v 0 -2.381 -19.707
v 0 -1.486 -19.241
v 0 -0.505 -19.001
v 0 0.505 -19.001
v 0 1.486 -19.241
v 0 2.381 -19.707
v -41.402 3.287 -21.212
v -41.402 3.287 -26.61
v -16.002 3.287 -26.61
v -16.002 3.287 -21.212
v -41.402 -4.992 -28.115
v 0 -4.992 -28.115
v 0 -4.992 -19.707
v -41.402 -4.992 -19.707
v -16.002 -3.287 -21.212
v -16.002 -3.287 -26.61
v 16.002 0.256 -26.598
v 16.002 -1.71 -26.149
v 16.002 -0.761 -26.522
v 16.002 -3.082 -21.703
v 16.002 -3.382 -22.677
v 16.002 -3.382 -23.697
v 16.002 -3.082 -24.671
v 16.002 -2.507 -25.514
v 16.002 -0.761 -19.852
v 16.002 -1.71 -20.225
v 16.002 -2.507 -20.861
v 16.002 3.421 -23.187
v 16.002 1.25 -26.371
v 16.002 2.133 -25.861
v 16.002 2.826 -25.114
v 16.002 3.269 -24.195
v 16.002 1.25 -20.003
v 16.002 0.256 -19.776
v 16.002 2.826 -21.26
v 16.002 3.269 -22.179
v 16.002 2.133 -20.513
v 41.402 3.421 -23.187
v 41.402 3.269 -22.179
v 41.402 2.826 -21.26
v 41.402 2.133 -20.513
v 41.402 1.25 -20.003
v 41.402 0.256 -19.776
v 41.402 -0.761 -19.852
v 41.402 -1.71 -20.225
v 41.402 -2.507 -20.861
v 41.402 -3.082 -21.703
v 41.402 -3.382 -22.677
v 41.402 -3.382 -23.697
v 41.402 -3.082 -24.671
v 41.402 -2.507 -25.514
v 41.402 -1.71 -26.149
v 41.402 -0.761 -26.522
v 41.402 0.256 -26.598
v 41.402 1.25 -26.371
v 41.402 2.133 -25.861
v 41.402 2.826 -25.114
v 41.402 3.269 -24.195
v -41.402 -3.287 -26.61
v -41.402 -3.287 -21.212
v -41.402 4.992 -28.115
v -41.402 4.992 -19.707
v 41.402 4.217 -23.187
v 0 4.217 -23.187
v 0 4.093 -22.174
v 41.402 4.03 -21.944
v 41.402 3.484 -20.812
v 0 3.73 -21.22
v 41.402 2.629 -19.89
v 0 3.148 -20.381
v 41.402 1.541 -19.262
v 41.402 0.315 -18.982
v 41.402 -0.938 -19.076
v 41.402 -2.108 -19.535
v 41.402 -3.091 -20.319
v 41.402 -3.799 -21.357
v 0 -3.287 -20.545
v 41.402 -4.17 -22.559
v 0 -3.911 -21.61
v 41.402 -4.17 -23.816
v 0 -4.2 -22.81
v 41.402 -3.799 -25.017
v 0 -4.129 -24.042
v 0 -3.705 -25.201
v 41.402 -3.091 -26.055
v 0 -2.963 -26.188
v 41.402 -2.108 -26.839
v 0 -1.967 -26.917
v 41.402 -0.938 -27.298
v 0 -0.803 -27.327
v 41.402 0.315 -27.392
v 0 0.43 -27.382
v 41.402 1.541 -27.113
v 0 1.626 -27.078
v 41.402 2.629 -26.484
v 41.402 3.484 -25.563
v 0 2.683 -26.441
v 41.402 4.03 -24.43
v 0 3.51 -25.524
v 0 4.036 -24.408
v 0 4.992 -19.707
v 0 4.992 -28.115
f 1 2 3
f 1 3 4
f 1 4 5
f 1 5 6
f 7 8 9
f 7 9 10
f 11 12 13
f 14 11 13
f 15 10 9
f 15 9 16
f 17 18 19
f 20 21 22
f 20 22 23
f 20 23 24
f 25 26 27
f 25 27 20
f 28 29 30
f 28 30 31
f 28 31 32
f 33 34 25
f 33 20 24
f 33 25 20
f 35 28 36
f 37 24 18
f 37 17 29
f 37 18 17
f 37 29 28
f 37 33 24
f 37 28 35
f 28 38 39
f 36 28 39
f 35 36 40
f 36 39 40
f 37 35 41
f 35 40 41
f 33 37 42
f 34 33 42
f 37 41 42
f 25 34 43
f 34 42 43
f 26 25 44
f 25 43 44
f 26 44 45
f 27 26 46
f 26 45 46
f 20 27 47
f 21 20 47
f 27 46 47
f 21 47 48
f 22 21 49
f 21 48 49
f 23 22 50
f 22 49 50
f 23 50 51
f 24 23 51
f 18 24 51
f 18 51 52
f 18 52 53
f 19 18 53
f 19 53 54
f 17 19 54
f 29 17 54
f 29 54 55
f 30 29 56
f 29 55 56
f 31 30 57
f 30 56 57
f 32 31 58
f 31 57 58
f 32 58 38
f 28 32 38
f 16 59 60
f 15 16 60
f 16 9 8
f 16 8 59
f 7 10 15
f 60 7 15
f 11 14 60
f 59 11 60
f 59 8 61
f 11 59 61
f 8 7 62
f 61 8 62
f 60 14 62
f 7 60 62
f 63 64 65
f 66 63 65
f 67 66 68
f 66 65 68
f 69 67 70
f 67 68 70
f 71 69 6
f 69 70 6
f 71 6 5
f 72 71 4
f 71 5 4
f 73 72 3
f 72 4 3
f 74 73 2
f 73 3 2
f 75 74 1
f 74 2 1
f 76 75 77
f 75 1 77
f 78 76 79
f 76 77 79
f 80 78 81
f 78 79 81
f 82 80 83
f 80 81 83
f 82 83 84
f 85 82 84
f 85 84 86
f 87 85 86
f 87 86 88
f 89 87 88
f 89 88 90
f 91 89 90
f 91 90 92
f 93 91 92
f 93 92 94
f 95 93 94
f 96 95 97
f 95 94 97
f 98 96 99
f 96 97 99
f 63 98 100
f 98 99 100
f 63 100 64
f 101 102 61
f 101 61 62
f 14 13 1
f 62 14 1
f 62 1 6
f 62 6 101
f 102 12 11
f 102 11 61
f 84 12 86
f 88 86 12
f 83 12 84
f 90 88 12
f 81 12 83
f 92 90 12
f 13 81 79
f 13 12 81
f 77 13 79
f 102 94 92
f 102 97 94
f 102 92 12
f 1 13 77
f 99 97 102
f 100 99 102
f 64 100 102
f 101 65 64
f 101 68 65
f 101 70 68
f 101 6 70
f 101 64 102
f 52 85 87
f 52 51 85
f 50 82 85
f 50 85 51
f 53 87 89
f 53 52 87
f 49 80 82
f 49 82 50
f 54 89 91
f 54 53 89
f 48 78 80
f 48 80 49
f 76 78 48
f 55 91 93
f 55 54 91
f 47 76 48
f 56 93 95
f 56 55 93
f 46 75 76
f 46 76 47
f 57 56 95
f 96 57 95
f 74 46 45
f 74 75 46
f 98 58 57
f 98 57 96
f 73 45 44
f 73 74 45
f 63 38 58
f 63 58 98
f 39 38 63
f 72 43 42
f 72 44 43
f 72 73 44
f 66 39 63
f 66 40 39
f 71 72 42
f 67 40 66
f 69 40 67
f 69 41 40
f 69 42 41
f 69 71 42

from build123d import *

# Parameters (mm, degrees)
F2_R     = 4.2169292551
F3_DEPTH = 41.402
F4_R     = 3.4205639175
F5_DEPTH = 25.4
F6_W     = 9.9848257378
F6_H     = 8.4082745016
F7_DEPTH = 41.402
F8_W     = 6.5733380616
F8_H     = 5.3974576294
F9_DEPTH = 25.4


# Not quite as in the source:
# - the program builds the solid bodies; features that only make, move or delete a surface that nothing else refers to are left out


with BuildPart() as f3:
    # F2 (on Right) → F3 (new body)
    with BuildSketch(Plane.YZ):
        with Locations((0, -23.187154904)):
            Circle(F2_R)
    extrude(amount=F3_DEPTH)

    # F4 (on face) → F5 (cut)
    with BuildSketch(Plane.YZ.offset(41.402)):
        with Locations((0, -23.187154904)):
            Circle(F4_R)
    extrude(amount=-F5_DEPTH, mode=Mode.SUBTRACT)

    # F6 (on Right) → F7 (join)
    with BuildSketch(Plane.YZ):
        with Locations((0, -23.9110346884)):
            Rectangle(F6_W, F6_H)
    extrude(amount=-F7_DEPTH)

    # F8 (on face) → F9 (cut)
    with BuildSketch(Plane(origin=(-41.402, 0, 0), x_dir=(0, -1, 0), z_dir=(-1, 0, 0))):
        with Locations((0, -23.9110346884)):
            Rectangle(F8_W, F8_H)
    extrude(amount=-F9_DEPTH, mode=Mode.SUBTRACT)


solid = f3.part
